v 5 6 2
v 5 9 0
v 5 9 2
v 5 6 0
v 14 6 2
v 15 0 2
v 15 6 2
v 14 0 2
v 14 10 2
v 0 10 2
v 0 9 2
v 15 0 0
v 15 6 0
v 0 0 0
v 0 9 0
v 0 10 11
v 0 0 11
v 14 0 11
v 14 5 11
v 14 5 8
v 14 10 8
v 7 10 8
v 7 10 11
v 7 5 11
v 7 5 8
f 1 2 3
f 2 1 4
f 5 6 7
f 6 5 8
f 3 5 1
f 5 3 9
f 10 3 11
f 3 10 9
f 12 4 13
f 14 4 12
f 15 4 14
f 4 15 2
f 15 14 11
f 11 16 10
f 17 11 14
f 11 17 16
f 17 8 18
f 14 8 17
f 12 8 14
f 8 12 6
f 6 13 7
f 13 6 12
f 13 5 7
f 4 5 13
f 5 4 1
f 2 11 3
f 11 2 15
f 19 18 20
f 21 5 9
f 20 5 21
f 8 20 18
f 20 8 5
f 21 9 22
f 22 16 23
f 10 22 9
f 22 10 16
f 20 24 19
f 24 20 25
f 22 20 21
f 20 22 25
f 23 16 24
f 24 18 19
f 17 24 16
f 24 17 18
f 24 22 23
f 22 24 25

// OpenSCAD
translate([2.5, 1.5, 1.0]) color([0.07197168951426236, 0.3010615360013691, 0.43606864795325617]) cube([5, 3, 2], center=true);
translate([7.5, 1.5, 1.0]) color([0.06104243921962749, 0.46713122754826175, 0.5964849226245376]) cube([5, 3, 2], center=true);
translate([12.5, 1.5, 1.0]) color([0.6993231250959273, 0.39127619713064865, 0.2601332542192585]) cube([5, 3, 2], center=true);
translate([2.5, 4.5, 1.0]) color([0.9043986330300443, 0.47021616129820465, 0.9023042315131579]) cube([5, 3, 2], center=true);
translate([7.5, 4.5, 1.0]) color([0.5697685418235108, 0.6976970707821888, 0.2034146857749588]) cube([5, 3, 2], center=true);
translate([12.5, 4.5, 1.0]) color([0.7673483420763234, 0.7886482900098098, 0.1582086298273846]) cube([5, 3, 2], center=true);
translate([2.5, 7.5, 1.0]) color([0.16195407019788421, 0.5294742230377147, 0.11721284387105246]) cube([5, 3, 2], center=true);
translate([3.5, 2.5, 3.5]) color([0.9214183944636138, 0.6656058220179341, 0.01320375853497835]) cube([7, 5, 3], center=true);
translate([10.5, 2.5, 3.5]) color([0.6812806756042346, 0.9000980523907597, 0.8748046942695984]) cube([7, 5, 3], center=true);
translate([3.5, 7.5, 3.5]) color([0.9175111227590292, 0.6489334878113245, 0.38864224283144744]) cube([7, 5, 3], center=true);
translate([10.5, 7.5, 3.5]) color([0.6576161999324908, 0.15341277093142425, 0.6908227578732097]) cube([7, 5, 3], center=true);
translate([3.5, 2.5, 6.5]) color([0.4579542036471842, 0.07907378923830799, 0.7390161160059011]) cube([7, 5, 3], center=true);
translate([10.5, 2.5, 6.5]) color([0.5443194976514814, 0.13483760684825774, 0.7621666562045316]) cube([7, 5, 3], center=true);
translate([3.5, 7.5, 6.5]) color([0.4818270828740713, 0.6101356542697393, 0.673403459483394]) cube([7, 5, 3], center=true);
translate([10.5, 7.5, 6.5]) color([0.5902776863195436, 0.8919435414206076, 0.8537743808409336]) cube([7, 5, 3], center=true);
translate([3.5, 2.5, 9.5]) color([0.1323442810447465, 0.3102975814641805, 0.7484858811975865]) cube([7, 5, 3], center=true);
translate([10.5, 2.5, 9.5]) color([0.8289027709575956, 0.08072310687247075, 0.594576926472109]) cube([7, 5, 3], center=true);
translate([3.5, 7.5, 9.5]) color([0.6985826889753467, 0.16007977902454107, 0.22309782085865282]) cube([7, 5, 3], center=true);
